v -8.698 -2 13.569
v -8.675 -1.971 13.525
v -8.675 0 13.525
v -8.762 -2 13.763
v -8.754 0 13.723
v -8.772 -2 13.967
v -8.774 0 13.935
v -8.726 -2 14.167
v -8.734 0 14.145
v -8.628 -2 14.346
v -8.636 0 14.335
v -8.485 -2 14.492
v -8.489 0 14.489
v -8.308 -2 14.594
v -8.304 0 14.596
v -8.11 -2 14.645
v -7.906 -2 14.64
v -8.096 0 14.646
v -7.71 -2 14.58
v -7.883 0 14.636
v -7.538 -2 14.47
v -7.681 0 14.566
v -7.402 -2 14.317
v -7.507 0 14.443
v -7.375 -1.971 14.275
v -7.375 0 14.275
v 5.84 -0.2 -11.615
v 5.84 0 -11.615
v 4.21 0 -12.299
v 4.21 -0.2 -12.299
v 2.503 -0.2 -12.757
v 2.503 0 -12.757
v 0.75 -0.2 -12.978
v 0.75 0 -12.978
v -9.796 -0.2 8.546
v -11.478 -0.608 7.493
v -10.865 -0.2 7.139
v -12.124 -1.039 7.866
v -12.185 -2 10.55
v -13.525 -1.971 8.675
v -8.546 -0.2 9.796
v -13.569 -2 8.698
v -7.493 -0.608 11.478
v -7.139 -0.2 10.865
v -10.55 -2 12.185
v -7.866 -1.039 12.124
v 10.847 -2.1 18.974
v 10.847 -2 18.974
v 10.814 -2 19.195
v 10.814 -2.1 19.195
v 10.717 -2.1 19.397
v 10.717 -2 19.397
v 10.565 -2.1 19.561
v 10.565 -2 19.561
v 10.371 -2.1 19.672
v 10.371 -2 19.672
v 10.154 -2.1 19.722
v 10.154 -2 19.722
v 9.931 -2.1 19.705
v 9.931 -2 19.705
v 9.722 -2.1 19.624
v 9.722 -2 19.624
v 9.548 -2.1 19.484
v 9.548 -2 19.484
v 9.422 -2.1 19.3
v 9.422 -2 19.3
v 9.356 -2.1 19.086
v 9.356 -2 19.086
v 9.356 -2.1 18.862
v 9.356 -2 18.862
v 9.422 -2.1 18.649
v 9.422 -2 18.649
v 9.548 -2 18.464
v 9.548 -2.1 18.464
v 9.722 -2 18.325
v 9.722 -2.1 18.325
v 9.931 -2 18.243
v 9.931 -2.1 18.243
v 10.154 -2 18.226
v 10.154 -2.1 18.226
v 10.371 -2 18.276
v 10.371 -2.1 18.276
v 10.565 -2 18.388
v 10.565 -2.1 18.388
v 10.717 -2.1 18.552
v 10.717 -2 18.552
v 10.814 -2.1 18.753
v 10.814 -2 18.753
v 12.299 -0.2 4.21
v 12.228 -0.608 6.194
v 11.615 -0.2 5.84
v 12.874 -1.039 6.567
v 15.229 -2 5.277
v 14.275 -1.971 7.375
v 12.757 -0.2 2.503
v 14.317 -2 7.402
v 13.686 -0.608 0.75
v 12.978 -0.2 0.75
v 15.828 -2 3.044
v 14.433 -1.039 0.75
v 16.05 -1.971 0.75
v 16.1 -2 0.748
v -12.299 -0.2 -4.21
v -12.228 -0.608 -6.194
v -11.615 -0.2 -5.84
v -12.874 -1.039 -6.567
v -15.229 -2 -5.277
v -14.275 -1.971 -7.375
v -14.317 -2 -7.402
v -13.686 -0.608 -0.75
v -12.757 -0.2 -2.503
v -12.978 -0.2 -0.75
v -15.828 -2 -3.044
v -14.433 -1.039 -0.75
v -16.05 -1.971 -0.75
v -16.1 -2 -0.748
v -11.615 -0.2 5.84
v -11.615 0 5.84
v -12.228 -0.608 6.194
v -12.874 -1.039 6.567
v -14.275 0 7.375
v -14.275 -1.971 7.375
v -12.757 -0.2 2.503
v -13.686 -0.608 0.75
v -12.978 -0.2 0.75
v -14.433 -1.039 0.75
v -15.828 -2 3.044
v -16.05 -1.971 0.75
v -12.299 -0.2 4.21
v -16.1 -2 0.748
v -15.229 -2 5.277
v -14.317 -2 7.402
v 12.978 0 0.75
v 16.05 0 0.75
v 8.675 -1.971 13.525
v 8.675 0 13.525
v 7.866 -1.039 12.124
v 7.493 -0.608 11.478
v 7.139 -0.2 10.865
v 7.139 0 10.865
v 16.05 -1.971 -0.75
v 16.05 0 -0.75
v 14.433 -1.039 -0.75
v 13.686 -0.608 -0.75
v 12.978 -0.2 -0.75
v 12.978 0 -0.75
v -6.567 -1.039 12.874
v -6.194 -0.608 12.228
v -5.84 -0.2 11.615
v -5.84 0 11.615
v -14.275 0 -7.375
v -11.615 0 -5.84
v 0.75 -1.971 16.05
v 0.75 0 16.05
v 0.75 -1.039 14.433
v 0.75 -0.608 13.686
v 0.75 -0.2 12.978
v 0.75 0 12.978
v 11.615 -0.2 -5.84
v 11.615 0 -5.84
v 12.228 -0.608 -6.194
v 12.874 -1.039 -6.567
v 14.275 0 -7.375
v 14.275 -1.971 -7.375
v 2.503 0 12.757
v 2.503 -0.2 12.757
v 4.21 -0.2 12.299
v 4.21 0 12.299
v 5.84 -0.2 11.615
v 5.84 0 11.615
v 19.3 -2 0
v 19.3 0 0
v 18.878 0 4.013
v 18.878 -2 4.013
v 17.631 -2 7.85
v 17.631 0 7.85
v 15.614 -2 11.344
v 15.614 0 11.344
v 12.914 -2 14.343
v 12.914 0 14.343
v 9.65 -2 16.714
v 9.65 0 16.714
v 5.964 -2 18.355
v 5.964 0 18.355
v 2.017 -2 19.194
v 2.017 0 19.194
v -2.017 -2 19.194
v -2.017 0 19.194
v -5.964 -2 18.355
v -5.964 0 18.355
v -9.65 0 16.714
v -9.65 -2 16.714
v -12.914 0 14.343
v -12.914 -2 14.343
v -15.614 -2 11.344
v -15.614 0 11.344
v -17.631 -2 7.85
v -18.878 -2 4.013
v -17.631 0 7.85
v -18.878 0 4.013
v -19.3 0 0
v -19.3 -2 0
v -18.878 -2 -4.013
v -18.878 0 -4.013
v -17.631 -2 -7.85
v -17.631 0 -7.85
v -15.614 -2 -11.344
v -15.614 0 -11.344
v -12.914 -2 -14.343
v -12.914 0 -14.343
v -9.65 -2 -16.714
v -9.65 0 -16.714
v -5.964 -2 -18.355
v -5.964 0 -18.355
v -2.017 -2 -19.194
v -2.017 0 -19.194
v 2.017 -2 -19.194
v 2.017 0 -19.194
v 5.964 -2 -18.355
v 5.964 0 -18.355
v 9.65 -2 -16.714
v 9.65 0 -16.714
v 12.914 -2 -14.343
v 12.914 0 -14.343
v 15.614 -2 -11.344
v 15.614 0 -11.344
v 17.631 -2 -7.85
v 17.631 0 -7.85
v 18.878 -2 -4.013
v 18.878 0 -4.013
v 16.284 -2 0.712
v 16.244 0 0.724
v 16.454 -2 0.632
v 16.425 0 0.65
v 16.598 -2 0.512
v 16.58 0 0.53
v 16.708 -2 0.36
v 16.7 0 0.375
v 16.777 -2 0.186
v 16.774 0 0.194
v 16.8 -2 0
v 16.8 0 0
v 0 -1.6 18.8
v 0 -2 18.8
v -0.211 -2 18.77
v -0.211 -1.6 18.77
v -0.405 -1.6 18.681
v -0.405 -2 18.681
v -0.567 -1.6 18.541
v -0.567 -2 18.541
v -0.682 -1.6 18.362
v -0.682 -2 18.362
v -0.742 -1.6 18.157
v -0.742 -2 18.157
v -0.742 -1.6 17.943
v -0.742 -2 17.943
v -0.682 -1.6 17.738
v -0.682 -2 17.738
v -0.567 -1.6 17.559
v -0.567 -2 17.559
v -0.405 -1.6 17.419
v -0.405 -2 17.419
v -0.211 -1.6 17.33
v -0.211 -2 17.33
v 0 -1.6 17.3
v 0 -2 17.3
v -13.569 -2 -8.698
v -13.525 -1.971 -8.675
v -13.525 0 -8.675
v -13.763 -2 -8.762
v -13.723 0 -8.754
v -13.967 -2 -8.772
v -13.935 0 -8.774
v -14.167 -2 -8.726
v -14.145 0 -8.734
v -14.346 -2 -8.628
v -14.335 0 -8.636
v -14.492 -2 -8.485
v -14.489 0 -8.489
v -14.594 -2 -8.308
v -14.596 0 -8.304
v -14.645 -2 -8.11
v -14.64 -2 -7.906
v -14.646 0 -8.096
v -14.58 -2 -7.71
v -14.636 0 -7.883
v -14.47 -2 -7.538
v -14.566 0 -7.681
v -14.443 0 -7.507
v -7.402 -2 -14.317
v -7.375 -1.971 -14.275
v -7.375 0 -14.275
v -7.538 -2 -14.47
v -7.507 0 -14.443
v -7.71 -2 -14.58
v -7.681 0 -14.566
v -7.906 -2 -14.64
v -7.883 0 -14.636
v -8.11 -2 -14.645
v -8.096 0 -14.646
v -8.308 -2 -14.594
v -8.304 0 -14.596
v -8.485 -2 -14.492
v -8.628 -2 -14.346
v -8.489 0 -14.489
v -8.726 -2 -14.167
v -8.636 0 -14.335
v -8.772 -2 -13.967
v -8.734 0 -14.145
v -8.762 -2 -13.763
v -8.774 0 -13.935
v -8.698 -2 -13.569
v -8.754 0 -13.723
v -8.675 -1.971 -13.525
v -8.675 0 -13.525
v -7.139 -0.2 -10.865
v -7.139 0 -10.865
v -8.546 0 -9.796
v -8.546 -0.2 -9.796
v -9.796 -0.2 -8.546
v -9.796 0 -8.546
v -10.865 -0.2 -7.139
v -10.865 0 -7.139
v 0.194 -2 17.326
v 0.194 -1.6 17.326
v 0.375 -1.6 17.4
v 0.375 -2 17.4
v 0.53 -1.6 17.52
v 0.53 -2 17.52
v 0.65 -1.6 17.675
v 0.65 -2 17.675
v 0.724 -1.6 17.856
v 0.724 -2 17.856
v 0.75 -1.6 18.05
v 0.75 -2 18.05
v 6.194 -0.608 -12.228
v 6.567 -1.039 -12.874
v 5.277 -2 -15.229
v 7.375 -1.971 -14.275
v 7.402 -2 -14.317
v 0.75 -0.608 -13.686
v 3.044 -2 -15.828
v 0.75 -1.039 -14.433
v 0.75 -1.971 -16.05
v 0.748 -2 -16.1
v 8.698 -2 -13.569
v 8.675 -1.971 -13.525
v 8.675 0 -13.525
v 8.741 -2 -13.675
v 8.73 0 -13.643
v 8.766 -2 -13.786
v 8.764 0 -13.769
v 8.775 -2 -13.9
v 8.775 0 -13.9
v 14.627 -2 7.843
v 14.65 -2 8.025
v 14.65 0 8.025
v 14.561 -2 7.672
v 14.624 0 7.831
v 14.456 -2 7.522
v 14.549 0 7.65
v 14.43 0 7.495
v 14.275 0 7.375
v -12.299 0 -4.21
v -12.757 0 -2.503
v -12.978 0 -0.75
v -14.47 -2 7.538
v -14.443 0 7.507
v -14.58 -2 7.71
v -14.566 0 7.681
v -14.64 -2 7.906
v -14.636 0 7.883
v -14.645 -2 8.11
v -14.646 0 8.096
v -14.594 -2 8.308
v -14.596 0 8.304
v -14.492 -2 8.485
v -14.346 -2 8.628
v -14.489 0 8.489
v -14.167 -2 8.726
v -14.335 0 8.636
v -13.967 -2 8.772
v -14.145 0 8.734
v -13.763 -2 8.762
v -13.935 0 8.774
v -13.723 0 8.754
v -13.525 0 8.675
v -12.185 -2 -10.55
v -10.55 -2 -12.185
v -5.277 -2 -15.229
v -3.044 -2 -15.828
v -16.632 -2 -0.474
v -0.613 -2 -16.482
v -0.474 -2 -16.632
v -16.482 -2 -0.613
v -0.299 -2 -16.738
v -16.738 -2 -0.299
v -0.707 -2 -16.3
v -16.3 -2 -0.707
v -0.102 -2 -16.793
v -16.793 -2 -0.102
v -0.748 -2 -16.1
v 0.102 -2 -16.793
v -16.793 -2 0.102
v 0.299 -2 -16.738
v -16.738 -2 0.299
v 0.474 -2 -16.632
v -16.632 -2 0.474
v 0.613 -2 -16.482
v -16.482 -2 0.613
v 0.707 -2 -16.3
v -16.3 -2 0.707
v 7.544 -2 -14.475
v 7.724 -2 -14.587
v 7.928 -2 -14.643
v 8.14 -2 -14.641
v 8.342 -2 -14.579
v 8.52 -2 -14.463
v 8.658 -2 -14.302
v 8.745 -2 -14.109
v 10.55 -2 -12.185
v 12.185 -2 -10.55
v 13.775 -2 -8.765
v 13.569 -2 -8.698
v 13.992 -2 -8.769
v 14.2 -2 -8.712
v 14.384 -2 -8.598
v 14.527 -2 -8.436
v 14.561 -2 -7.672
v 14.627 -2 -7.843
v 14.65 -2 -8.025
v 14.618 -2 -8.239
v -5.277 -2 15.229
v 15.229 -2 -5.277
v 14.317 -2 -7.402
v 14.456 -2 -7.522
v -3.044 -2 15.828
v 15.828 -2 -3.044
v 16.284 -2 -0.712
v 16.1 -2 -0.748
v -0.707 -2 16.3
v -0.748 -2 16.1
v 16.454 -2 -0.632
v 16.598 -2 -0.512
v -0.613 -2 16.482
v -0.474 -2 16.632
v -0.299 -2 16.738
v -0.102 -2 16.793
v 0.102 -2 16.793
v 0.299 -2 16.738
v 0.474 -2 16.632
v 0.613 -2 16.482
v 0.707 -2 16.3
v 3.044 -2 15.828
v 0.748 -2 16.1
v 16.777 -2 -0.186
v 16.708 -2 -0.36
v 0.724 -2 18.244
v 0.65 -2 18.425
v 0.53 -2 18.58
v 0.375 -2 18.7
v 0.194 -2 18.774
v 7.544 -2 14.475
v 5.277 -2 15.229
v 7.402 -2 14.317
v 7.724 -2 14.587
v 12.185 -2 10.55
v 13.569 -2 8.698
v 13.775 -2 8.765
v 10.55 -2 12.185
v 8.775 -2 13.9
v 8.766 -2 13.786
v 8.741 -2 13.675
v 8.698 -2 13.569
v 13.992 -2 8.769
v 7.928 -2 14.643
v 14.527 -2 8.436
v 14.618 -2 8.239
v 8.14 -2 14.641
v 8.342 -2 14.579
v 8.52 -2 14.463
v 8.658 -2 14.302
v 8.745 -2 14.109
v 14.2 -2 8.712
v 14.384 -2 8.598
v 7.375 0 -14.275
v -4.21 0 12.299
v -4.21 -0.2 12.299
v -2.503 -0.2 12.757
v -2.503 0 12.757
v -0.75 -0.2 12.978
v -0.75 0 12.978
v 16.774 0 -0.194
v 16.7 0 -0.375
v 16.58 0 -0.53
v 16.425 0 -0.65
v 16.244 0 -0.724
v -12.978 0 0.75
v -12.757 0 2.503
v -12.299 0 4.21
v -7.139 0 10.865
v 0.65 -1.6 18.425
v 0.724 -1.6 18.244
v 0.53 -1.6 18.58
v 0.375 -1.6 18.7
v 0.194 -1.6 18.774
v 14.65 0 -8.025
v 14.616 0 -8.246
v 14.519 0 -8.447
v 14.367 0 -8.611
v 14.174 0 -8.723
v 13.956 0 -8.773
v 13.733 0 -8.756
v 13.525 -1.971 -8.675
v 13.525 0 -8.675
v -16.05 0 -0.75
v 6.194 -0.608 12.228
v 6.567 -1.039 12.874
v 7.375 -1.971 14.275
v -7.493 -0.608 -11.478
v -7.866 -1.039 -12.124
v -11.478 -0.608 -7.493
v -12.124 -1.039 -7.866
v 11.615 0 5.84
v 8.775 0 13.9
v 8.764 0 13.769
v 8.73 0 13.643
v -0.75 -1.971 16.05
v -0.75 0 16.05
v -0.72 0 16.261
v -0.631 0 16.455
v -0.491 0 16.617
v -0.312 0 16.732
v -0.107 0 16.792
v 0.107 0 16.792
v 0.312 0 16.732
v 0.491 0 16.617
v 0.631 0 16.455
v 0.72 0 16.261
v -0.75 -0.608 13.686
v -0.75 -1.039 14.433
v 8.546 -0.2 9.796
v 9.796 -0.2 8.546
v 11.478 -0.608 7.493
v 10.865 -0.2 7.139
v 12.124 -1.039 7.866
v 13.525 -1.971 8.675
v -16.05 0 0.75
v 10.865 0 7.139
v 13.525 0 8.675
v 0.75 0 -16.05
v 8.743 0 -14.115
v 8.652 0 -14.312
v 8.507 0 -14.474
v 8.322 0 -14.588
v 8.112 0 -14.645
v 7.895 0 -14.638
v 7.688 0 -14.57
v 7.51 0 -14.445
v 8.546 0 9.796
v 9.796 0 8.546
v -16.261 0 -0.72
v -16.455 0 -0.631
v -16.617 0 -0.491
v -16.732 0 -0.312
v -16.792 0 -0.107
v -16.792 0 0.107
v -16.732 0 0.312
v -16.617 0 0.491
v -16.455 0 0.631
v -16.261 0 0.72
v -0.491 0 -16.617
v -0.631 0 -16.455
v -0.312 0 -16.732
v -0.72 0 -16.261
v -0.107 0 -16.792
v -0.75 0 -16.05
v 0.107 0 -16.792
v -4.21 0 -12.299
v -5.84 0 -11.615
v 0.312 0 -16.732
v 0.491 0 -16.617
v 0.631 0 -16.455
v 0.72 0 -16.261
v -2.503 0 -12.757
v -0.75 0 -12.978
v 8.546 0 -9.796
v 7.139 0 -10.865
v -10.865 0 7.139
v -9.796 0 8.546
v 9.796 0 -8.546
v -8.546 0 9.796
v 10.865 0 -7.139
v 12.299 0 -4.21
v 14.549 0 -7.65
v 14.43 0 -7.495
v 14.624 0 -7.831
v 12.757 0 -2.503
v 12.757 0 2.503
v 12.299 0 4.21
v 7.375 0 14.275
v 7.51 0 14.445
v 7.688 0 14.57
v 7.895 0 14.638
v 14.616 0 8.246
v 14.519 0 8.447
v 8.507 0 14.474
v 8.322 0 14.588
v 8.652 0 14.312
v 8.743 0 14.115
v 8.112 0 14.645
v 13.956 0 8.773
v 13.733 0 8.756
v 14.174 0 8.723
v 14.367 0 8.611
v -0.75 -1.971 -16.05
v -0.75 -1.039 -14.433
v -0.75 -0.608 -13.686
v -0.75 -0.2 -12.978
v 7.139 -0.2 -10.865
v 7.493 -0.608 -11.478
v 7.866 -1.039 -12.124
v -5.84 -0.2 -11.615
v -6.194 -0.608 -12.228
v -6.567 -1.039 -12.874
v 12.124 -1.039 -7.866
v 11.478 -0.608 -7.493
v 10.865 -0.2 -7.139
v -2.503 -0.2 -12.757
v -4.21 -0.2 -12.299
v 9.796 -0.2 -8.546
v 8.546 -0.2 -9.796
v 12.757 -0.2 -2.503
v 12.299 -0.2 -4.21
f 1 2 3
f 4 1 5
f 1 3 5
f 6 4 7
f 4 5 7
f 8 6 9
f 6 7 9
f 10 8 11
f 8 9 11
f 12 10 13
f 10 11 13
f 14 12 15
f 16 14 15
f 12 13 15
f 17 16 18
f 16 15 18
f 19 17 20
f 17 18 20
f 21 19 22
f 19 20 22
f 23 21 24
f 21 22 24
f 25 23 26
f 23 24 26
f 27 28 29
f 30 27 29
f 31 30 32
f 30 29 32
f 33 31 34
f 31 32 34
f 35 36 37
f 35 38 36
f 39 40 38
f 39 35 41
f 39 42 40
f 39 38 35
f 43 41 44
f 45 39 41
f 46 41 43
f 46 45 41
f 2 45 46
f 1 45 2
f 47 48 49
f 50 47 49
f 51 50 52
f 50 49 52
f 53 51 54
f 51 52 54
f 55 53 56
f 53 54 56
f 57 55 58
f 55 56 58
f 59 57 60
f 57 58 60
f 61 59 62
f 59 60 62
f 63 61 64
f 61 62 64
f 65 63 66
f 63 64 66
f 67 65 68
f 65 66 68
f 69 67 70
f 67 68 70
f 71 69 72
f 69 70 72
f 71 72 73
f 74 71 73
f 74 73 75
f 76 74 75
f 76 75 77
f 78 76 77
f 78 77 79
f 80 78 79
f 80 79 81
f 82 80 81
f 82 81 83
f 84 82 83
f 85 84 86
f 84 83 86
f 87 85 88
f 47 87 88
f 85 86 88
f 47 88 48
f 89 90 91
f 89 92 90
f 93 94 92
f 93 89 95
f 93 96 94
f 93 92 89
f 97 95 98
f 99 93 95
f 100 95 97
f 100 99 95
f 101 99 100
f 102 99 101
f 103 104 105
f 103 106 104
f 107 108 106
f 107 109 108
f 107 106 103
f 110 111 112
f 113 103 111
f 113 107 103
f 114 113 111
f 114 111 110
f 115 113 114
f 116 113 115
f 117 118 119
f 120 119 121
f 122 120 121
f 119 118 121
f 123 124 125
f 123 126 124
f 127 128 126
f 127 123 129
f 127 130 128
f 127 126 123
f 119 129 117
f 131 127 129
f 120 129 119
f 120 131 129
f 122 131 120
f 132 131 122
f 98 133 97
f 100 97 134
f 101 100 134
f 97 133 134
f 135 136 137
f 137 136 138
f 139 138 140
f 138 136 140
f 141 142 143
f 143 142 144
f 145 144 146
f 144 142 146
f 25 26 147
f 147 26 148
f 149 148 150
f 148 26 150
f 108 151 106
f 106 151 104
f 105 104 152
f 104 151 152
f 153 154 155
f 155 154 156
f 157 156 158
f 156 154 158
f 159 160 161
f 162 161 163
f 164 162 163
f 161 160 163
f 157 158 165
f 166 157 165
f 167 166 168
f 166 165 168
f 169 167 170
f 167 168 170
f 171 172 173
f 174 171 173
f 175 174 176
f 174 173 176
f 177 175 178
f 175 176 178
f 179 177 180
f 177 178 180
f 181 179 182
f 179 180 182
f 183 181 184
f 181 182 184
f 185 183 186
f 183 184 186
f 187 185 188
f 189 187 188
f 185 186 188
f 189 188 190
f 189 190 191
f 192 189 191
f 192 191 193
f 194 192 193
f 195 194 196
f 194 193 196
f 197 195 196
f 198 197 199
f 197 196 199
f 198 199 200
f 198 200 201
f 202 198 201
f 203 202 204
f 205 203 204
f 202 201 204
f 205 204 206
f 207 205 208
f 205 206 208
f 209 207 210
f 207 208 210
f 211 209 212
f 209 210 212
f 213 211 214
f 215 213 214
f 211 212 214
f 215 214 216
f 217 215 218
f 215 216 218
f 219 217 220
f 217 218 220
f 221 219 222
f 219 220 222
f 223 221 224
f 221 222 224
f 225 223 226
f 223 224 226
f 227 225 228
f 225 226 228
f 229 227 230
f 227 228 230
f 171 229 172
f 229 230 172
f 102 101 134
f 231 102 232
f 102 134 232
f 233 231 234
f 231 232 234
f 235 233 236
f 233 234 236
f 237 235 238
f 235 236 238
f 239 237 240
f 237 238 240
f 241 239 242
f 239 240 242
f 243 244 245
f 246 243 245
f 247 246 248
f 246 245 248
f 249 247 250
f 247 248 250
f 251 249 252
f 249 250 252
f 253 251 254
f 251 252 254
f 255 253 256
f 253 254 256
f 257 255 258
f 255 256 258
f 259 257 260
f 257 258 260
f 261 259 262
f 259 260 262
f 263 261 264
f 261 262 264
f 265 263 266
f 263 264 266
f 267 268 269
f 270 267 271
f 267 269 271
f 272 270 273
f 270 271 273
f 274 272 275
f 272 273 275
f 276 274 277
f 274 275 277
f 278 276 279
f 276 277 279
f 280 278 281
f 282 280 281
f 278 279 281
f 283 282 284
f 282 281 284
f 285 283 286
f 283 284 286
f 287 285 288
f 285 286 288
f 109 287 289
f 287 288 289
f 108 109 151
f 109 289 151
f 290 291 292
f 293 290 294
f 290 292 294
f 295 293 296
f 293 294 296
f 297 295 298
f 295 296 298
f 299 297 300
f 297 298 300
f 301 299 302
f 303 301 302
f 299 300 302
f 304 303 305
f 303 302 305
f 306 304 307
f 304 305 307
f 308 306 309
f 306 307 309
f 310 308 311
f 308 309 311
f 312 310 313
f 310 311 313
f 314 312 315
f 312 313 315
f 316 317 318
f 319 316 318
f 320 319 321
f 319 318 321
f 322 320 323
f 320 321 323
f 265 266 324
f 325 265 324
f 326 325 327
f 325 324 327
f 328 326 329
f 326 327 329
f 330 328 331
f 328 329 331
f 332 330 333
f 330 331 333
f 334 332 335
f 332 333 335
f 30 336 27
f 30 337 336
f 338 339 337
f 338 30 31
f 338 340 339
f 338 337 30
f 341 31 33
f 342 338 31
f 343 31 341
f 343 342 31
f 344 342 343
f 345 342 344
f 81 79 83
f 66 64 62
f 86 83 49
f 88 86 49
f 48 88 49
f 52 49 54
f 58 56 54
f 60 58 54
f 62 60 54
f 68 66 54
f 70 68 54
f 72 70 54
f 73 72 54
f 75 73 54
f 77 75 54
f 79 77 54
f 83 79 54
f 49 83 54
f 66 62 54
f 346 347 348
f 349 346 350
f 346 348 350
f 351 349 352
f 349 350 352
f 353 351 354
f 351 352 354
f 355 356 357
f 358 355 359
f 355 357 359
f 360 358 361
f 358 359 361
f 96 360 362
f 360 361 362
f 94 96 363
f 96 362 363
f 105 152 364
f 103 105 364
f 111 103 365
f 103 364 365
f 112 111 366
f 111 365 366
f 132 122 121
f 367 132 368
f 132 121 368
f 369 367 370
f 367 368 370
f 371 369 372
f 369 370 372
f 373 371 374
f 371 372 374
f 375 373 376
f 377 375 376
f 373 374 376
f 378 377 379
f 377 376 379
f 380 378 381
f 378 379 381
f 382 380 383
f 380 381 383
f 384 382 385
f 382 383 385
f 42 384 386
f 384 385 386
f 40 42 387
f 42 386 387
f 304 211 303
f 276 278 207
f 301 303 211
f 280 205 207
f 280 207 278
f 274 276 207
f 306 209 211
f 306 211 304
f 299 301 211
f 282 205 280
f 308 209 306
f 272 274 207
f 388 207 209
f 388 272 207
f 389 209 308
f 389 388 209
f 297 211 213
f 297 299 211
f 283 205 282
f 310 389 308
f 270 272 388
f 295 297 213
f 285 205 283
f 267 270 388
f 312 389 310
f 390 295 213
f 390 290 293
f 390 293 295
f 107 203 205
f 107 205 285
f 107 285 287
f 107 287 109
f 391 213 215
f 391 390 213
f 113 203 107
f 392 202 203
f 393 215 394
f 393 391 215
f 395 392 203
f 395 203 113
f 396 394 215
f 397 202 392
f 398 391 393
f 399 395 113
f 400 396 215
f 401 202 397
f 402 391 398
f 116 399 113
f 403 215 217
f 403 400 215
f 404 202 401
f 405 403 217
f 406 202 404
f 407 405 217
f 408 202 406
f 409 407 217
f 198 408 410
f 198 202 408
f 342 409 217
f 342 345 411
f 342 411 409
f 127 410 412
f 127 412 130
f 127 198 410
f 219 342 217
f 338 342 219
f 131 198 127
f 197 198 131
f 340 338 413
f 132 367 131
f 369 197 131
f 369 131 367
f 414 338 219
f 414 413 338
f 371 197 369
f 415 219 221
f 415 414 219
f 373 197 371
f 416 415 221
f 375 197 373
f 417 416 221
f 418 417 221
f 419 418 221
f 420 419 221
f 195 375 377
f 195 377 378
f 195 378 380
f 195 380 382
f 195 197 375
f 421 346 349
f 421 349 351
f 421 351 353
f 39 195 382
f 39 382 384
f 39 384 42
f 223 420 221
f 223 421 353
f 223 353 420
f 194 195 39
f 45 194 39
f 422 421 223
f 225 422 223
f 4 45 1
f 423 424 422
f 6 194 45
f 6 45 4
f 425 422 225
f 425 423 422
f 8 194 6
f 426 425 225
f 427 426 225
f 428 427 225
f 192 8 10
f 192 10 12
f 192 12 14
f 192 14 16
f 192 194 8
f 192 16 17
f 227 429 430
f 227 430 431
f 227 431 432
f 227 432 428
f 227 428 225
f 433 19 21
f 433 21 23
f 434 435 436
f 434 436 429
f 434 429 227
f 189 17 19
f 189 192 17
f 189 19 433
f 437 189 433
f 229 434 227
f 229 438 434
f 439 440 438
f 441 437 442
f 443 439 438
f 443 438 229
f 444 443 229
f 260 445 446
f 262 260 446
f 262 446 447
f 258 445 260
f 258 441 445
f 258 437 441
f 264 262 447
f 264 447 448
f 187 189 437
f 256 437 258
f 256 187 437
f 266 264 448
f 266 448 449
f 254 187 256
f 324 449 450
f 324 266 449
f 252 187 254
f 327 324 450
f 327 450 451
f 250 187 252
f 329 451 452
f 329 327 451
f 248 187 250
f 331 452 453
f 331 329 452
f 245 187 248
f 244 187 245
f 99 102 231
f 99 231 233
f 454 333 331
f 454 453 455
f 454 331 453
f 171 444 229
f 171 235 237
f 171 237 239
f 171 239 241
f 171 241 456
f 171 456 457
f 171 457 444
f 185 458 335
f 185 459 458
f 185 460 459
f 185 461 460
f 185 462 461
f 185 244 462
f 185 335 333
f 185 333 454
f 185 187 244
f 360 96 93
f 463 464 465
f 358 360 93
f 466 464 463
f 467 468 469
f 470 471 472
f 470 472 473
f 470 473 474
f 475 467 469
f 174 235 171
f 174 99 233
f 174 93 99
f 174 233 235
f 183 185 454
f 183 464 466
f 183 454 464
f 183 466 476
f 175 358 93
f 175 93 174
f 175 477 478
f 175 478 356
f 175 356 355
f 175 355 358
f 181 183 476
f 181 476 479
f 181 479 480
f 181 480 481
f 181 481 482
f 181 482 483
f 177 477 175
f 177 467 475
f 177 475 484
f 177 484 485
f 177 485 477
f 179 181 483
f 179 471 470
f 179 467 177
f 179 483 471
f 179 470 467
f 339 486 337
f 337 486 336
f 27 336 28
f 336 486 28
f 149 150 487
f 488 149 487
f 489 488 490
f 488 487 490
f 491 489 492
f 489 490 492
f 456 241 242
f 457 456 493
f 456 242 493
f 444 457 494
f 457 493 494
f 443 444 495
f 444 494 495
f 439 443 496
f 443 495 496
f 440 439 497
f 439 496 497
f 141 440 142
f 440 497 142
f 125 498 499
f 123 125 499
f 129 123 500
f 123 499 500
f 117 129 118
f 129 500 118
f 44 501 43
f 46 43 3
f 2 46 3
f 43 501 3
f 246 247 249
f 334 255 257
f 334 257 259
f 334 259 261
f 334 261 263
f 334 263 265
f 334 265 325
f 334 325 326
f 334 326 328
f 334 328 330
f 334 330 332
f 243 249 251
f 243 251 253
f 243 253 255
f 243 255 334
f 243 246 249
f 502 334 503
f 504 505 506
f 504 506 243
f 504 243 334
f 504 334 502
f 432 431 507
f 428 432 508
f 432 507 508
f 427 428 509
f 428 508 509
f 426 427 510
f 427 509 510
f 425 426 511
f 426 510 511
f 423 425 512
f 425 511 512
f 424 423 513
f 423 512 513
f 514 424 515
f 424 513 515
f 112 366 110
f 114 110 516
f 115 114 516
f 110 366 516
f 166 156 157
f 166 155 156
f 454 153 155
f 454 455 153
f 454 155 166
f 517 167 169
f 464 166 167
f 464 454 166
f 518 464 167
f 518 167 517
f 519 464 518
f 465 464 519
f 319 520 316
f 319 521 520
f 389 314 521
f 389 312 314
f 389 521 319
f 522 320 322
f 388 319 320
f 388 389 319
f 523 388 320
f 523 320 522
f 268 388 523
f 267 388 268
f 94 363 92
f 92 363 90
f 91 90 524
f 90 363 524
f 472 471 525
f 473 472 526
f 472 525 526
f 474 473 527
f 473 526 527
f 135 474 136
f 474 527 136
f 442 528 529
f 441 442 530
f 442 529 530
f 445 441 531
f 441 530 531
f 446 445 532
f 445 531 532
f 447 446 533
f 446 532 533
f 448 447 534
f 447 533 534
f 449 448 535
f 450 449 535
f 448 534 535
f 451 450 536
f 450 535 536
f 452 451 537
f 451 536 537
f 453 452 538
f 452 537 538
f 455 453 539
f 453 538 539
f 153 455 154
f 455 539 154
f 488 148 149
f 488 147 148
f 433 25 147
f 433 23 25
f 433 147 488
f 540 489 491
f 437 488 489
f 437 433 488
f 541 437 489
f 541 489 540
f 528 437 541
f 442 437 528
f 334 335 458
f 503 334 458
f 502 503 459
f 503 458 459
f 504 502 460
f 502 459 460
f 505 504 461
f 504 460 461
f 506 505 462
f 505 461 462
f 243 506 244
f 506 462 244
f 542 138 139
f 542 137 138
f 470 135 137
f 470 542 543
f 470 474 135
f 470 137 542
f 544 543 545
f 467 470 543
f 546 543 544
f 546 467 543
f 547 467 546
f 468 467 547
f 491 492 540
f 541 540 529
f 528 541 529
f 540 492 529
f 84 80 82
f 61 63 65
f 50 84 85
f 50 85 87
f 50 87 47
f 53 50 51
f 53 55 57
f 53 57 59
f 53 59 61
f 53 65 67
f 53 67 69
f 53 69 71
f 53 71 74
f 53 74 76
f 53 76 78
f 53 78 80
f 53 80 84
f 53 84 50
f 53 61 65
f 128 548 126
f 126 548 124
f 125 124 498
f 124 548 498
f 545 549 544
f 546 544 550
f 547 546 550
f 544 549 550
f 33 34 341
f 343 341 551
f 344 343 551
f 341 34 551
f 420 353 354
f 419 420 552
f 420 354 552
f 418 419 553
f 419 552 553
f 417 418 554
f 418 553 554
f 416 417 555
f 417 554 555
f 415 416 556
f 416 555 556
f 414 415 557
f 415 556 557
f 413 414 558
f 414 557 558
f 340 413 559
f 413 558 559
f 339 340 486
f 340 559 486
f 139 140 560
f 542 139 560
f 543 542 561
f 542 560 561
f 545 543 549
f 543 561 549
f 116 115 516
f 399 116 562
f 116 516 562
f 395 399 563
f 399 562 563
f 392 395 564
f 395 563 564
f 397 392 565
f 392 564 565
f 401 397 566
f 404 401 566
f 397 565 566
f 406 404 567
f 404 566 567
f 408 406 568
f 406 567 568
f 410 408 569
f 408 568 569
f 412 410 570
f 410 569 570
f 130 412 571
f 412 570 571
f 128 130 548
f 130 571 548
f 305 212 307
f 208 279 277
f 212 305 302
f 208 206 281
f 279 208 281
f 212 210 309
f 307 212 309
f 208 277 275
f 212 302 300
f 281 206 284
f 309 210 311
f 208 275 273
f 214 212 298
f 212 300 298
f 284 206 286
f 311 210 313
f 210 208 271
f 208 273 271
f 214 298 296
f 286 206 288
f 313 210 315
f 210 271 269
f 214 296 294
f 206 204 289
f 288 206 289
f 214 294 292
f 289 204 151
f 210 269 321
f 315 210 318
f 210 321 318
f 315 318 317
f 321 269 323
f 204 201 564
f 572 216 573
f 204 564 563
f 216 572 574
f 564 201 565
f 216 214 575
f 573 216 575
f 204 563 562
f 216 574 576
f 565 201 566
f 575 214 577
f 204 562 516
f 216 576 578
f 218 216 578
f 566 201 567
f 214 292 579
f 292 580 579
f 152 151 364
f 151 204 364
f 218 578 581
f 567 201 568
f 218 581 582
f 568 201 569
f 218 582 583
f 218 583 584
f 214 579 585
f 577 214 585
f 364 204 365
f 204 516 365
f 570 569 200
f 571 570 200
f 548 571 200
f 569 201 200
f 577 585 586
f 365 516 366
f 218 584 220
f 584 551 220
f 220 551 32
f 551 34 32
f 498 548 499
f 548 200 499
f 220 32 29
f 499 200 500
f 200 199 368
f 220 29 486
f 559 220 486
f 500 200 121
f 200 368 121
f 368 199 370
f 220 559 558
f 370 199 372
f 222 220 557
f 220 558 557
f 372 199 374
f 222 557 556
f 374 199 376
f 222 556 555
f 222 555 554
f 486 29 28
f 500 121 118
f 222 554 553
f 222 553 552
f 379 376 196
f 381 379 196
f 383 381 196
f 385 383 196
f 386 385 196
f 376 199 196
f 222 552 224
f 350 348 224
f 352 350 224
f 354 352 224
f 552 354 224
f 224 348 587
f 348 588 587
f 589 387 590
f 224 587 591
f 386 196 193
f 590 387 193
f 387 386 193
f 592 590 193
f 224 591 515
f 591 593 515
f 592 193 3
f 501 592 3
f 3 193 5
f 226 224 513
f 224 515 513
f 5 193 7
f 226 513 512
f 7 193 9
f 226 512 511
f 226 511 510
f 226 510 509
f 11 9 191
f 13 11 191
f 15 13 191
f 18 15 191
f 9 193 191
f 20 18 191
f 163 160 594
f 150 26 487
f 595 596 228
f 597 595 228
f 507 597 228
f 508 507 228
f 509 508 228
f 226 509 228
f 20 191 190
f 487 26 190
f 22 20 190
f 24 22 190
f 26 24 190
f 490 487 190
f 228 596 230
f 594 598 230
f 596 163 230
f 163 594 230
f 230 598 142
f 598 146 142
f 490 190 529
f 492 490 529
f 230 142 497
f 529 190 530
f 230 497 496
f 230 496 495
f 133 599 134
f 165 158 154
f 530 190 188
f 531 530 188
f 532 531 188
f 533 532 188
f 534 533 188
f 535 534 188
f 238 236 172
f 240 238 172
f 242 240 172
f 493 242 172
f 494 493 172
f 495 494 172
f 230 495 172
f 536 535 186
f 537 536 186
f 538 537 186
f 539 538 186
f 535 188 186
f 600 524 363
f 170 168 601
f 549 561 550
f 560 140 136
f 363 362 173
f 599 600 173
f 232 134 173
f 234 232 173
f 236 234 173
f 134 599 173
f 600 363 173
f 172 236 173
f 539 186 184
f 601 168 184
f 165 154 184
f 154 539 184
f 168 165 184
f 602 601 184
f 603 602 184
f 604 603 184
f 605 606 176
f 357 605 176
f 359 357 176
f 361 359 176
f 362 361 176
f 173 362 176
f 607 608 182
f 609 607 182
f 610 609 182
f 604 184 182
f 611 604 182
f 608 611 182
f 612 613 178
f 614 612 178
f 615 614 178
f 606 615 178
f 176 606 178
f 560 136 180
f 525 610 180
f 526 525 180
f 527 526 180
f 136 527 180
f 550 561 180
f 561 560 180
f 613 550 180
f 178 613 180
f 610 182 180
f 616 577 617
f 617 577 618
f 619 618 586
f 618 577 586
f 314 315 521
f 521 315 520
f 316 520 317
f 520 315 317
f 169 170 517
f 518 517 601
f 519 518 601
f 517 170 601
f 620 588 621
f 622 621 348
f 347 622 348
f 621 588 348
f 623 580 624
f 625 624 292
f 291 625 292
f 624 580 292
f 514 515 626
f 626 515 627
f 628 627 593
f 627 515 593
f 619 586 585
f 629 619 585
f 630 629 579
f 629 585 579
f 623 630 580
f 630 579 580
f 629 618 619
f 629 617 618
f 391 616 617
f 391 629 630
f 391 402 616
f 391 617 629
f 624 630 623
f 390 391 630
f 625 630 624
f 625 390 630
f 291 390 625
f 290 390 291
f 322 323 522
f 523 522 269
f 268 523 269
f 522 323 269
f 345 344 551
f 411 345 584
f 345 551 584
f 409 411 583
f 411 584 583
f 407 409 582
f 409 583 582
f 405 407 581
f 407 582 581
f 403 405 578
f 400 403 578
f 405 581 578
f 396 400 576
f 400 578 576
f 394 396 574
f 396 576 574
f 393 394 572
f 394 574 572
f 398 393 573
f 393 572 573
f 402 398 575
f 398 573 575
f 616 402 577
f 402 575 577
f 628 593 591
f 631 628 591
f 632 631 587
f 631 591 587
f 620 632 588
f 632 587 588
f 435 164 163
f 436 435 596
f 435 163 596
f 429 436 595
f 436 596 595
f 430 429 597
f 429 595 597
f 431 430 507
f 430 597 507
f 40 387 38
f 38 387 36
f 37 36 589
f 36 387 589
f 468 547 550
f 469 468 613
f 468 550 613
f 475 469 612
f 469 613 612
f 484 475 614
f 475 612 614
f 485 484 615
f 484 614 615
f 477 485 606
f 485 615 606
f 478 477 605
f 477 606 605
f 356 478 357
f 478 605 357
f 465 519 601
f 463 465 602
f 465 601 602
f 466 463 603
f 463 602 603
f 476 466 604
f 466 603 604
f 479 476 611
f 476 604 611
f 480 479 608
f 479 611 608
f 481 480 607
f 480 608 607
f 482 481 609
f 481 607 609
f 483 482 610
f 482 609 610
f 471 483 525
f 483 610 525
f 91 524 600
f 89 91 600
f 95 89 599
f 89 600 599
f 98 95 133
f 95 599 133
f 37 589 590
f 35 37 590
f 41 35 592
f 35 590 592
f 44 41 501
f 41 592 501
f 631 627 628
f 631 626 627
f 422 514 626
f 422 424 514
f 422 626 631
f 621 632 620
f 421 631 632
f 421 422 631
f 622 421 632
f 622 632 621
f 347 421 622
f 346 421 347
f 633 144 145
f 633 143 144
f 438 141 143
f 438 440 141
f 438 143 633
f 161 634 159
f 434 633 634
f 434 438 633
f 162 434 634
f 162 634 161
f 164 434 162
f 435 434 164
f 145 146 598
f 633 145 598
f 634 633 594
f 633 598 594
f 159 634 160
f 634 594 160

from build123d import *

# Parameters (mm, degrees)
F0_R        = 19.3
F1_DEPTH    = 2
F2_SIZE2    = 3.1176914536
F2_SIZE     = 1.8
F2_2_SIZE2  = 3.1176914536
F2_2_SIZE   = 1.8
F2_3_SIZE2  = 3.1176914536
F2_3_SIZE   = 1.8
F2_4_SIZE2  = 3.1176914536
F2_4_SIZE   = 1.8
F2_5_SIZE2  = 3.1176914536
F2_5_SIZE   = 1.8
F2_6_SIZE2  = 3.1176914536
F2_6_SIZE   = 1.8
F2_7_SIZE2  = 3.1176914536
F2_7_SIZE   = 1.8
F2_8_SIZE2  = 3.1176914536
F2_8_SIZE   = 1.8
F2_9_SIZE2  = 3.1176914536
F2_9_SIZE   = 1.8
F2_10_SIZE2 = 3.1176914536
F2_10_SIZE  = 1.8
F2_11_SIZE2 = 3.1176914536
F2_11_SIZE  = 1.8
F2_12_SIZE2 = 3.1176914536
F2_12_SIZE  = 1.8
F4_DEPTH    = 0.4
F3_R        = 0.75
F5_DEPTH    = 0.1


# Not quite as in the source:
# - a feature names something its author has since deleted; it is built from what else it names


with BuildPart() as f1:
    # F0 (on Front) → F1 (new body)
    with BuildSketch(Plane.XZ):
        Circle(F0_R)
        with BuildLine():
            ThreePointArc((-16.05, -0.75), (-16.8, 0), (-16.05, 0.75))
            Line((-16.05, 0.75), (-12.9783473524, 0.75))
            ThreePointArc((-12.9783473524, 0.75), (-12.5570357418, 3.3646475863), (-11.6145785063, 5.8396546234))
            Line((-11.6145785063, 5.8396546234), (-14.2747077307, 7.3754809472))
            ThreePointArc((-14.2747077307, 7.3754809472), (-14.5492267836, 8.4), (-13.5247077307, 8.6745190528))
            Line((-13.5247077307, 8.6745190528), (-10.8645785063, 7.138692729))
            ThreePointArc((-10.8645785063, 7.138692729), (-9.1923881554, 9.1923881554), (-7.138692729, 10.8645785063))
            Line((-7.138692729, 10.8645785063), (-8.6745190528, 13.5247077307))
            ThreePointArc((-8.6745190528, 13.5247077307), (-8.4, 14.5492267836), (-7.3754809472, 14.2747077307))
            Line((-7.3754809472, 14.2747077307), (-5.8396546234, 11.6145785063))
            ThreePointArc((-5.8396546234, 11.6145785063), (-3.3646475863, 12.5570357418), (-0.75, 12.9783473524))
            Line((-0.75, 12.9783473524), (-0.75, 16.05))
            ThreePointArc((-0.75, 16.05), (0, 16.8), (0.75, 16.05))
            Line((0.75, 16.05), (0.75, 12.9783473524))
            ThreePointArc((0.75, 12.9783473524), (3.3646475863, 12.5570357418), (5.8396546234, 11.6145785063))
            Line((5.8396546234, 11.6145785063), (7.3754809472, 14.2747077307))
            ThreePointArc((7.3754809472, 14.2747077307), (8.2191142838, 14.6241521005), (8.775, 13.8997077307))
            ThreePointArc((8.775, 13.8997077307), (8.7494443697, 13.7055934469), (8.6745190528, 13.5247077307))
            Line((8.6745190528, 13.5247077307), (7.138692729, 10.8645785063))
            ThreePointArc((7.138692729, 10.8645785063), (9.1923881554, 9.1923881554), (10.8645785063, 7.138692729))
            Line((10.8645785063, 7.138692729), (13.5247077307, 8.6745190528))
            ThreePointArc((13.5247077307, 8.6745190528), (14.2747077307, 8.6745190528), (14.6497077307, 8.025))
            ThreePointArc((14.6497077307, 8.025), (14.5492267836, 7.65), (14.2747077307, 7.3754809472))
            Line((14.2747077307, 7.3754809472), (11.6145785063, 5.8396546234))
            ThreePointArc((11.6145785063, 5.8396546234), (12.5570357418, 3.3646475863), (12.9783473524, 0.75))
            Line((12.9783473524, 0.75), (16.05, 0.75))
            ThreePointArc((16.05, 0.75), (16.5803300859, 0.5303300859), (16.8, 0))
            ThreePointArc((16.8, 0), (16.5803300859, -0.5303300859), (16.05, -0.75))
            Line((16.05, -0.75), (12.9783473524, -0.75))
            ThreePointArc((12.9783473524, -0.75), (12.5570357418, -3.3646475863), (11.6145785063, -5.8396546234))
            Line((11.6145785063, -5.8396546234), (14.2747077307, -7.3754809472))
            ThreePointArc((14.2747077307, -7.3754809472), (14.5492267836, -7.65), (14.6497077307, -8.025))
            ThreePointArc((14.6497077307, -8.025), (14.2747077307, -8.6745190528), (13.5247077307, -8.6745190528))
            Line((13.5247077307, -8.6745190528), (10.8645785063, -7.138692729))
            ThreePointArc((10.8645785063, -7.138692729), (9.1923881554, -9.1923881554), (7.138692729, -10.8645785063))
            Line((7.138692729, -10.8645785063), (8.6745190528, -13.5247077307))
            ThreePointArc((8.6745190528, -13.5247077307), (8.7494443697, -13.7055934469), (8.775, -13.8997077307))
            ThreePointArc((8.775, -13.8997077307), (8.2191142838, -14.6241521005), (7.3754809472, -14.2747077307))
            Line((7.3754809472, -14.2747077307), (5.8396546234, -11.6145785063))
            ThreePointArc((5.8396546234, -11.6145785063), (3.3646475863, -12.5570357418), (0.75, -12.9783473524))
            Line((0.75, -12.9783473524), (0.75, -16.05))
            ThreePointArc((0.75, -16.05), (0, -16.8), (-0.75, -16.05))
            Line((-0.75, -16.05), (-0.75, -12.9783473524))
            ThreePointArc((-0.75, -12.9783473524), (-3.3646475863, -12.5570357418), (-5.8396546234, -11.6145785063))
            Line((-5.8396546234, -11.6145785063), (-7.3754809472, -14.2747077307))
            ThreePointArc((-7.3754809472, -14.2747077307), (-8.4, -14.5492267836), (-8.6745190528, -13.5247077307))
            Line((-8.6745190528, -13.5247077307), (-7.138692729, -10.8645785063))
            ThreePointArc((-7.138692729, -10.8645785063), (-9.1923881554, -9.1923881554), (-10.8645785063, -7.138692729))
            Line((-10.8645785063, -7.138692729), (-13.5247077307, -8.6745190528))
            ThreePointArc((-13.5247077307, -8.6745190528), (-14.5492267836, -8.4), (-14.2747077307, -7.3754809472))
            Line((-14.2747077307, -7.3754809472), (-11.6145785063, -5.8396546234))
            ThreePointArc((-11.6145785063, -5.8396546234), (-12.5570357418, -3.3646475863), (-12.9783473524, -0.75))
            Line((-12.9783473524, -0.75), (-16.05, -0.75))
        make_face(mode=Mode.SUBTRACT)
    extrude(amount=F1_DEPTH)

    # F2
    f2_edges = [f1.edges().sort_by_distance(p)[0] for p in [
        (-9.192388, -2, 9.192388),
    ]]
    f2_side = f1.faces().sort_by_distance((-9.192388, -1, 9.192388))[0]
    chamfer(f2_edges, length=F2_SIZE, length2=F2_SIZE2, reference=f2_side)

    # F2#2
    f2_2_edges = [f1.edges().sort_by_distance(p)[0] for p in [
        (-3.364648, -2, 12.557036),
    ]]
    f2_2_side = f1.faces().sort_by_distance((-3.364648, -1, 12.557036))[0]
    chamfer(f2_2_edges, length=F2_2_SIZE, length2=F2_2_SIZE2, reference=f2_2_side)

    # F2#3
    f2_3_edges = [f1.edges().sort_by_distance(p)[0] for p in [
        (3.364648, -2, 12.557036),
    ]]
    f2_3_side = f1.faces().sort_by_distance((3.364648, -1, 12.557036))[0]
    chamfer(f2_3_edges, length=F2_3_SIZE, length2=F2_3_SIZE2, reference=f2_3_side)

    # F2#4
    f2_4_edges = [f1.edges().sort_by_distance(p)[0] for p in [
        (9.192388, -2, 9.192388),
    ]]
    f2_4_side = f1.faces().sort_by_distance((9.192388, -1, 9.192388))[0]
    chamfer(f2_4_edges, length=F2_4_SIZE, length2=F2_4_SIZE2, reference=f2_4_side)

    # F2#5
    f2_5_edges = [f1.edges().sort_by_distance(p)[0] for p in [
        (12.557036, -2, 3.364648),
    ]]
    f2_5_side = f1.faces().sort_by_distance((12.557036, -1, 3.364648))[0]
    chamfer(f2_5_edges, length=F2_5_SIZE, length2=F2_5_SIZE2, reference=f2_5_side)

    # F2#6
    f2_6_edges = [f1.edges().sort_by_distance(p)[0] for p in [
        (-12.557036, -2, 3.364648),
    ]]
    f2_6_side = f1.faces().sort_by_distance((-12.557036, -1, 3.364648))[0]
    chamfer(f2_6_edges, length=F2_6_SIZE, length2=F2_6_SIZE2, reference=f2_6_side)

    # F2#7
    f2_7_edges = [f1.edges().sort_by_distance(p)[0] for p in [
        (-12.557036, -2, -3.364648),
    ]]
    f2_7_side = f1.faces().sort_by_distance((-12.557036, -1, -3.364648))[0]
    chamfer(f2_7_edges, length=F2_7_SIZE, length2=F2_7_SIZE2, reference=f2_7_side)

    # F2#8
    f2_8_edges = [f1.edges().sort_by_distance(p)[0] for p in [
        (-9.192388, -2, -9.192388),
    ]]
    f2_8_side = f1.faces().sort_by_distance((-9.192388, -1, -9.192388))[0]
    chamfer(f2_8_edges, length=F2_8_SIZE, length2=F2_8_SIZE2, reference=f2_8_side)

    # F2#9
    f2_9_edges = [f1.edges().sort_by_distance(p)[0] for p in [
        (-3.364648, -2, -12.557036),
    ]]
    f2_9_side = f1.faces().sort_by_distance((-3.364648, -1, -12.557036))[0]
    chamfer(f2_9_edges, length=F2_9_SIZE, length2=F2_9_SIZE2, reference=f2_9_side)

    # F2#10
    f2_10_edges = [f1.edges().sort_by_distance(p)[0] for p in [
        (3.364648, -2, -12.557036),
    ]]
    f2_10_side = f1.faces().sort_by_distance((3.364648, -1, -12.557036))[0]
    chamfer(f2_10_edges, length=F2_10_SIZE, length2=F2_10_SIZE2, reference=f2_10_side)

    # F2#11
    f2_11_edges = [f1.edges().sort_by_distance(p)[0] for p in [
        (9.192388, -2, -9.192388),
    ]]
    f2_11_side = f1.faces().sort_by_distance((9.192388, -1, -9.192388))[0]
    chamfer(f2_11_edges, length=F2_11_SIZE, length2=F2_11_SIZE2, reference=f2_11_side)

    # F2#12
    f2_12_edges = [f1.edges().sort_by_distance(p)[0] for p in [
        (12.557036, -2, -3.364648),
    ]]
    f2_12_side = f1.faces().sort_by_distance((12.557036, -1, -3.364648))[0]
    chamfer(f2_12_edges, length=F2_12_SIZE, length2=F2_12_SIZE2, reference=f2_12_side)

    # F3 (on face) → F4 (cut)
    with BuildSketch(Plane.XZ.offset(2)):
        with BuildLine():
            ThreePointArc((0, 18.8), (-0.75, 18.05), (0, 17.3))
            Line((0, 17.3), (0, 18.8))
        make_face()
        with BuildLine():
            Line((0, 18.8), (0, 17.3))
            ThreePointArc((0, 17.3), (0.5303300859, 17.5196699141), (0.75, 18.05))
            ThreePointArc((0.75, 18.05), (0.5303300859, 18.5803300859), (0, 18.8))
        make_face()
    extrude(amount=-F4_DEPTH, mode=Mode.SUBTRACT)


with BuildPart() as f5:
    # F3 (on face) → F5 (new body)
    with BuildSketch(Plane.XZ.offset(2)):
        with Locations((10.0974785164, 18.974237144)):
            Circle(F3_R)
    extrude(amount=F5_DEPTH)


solid = Compound([f1.part, f5.part])
